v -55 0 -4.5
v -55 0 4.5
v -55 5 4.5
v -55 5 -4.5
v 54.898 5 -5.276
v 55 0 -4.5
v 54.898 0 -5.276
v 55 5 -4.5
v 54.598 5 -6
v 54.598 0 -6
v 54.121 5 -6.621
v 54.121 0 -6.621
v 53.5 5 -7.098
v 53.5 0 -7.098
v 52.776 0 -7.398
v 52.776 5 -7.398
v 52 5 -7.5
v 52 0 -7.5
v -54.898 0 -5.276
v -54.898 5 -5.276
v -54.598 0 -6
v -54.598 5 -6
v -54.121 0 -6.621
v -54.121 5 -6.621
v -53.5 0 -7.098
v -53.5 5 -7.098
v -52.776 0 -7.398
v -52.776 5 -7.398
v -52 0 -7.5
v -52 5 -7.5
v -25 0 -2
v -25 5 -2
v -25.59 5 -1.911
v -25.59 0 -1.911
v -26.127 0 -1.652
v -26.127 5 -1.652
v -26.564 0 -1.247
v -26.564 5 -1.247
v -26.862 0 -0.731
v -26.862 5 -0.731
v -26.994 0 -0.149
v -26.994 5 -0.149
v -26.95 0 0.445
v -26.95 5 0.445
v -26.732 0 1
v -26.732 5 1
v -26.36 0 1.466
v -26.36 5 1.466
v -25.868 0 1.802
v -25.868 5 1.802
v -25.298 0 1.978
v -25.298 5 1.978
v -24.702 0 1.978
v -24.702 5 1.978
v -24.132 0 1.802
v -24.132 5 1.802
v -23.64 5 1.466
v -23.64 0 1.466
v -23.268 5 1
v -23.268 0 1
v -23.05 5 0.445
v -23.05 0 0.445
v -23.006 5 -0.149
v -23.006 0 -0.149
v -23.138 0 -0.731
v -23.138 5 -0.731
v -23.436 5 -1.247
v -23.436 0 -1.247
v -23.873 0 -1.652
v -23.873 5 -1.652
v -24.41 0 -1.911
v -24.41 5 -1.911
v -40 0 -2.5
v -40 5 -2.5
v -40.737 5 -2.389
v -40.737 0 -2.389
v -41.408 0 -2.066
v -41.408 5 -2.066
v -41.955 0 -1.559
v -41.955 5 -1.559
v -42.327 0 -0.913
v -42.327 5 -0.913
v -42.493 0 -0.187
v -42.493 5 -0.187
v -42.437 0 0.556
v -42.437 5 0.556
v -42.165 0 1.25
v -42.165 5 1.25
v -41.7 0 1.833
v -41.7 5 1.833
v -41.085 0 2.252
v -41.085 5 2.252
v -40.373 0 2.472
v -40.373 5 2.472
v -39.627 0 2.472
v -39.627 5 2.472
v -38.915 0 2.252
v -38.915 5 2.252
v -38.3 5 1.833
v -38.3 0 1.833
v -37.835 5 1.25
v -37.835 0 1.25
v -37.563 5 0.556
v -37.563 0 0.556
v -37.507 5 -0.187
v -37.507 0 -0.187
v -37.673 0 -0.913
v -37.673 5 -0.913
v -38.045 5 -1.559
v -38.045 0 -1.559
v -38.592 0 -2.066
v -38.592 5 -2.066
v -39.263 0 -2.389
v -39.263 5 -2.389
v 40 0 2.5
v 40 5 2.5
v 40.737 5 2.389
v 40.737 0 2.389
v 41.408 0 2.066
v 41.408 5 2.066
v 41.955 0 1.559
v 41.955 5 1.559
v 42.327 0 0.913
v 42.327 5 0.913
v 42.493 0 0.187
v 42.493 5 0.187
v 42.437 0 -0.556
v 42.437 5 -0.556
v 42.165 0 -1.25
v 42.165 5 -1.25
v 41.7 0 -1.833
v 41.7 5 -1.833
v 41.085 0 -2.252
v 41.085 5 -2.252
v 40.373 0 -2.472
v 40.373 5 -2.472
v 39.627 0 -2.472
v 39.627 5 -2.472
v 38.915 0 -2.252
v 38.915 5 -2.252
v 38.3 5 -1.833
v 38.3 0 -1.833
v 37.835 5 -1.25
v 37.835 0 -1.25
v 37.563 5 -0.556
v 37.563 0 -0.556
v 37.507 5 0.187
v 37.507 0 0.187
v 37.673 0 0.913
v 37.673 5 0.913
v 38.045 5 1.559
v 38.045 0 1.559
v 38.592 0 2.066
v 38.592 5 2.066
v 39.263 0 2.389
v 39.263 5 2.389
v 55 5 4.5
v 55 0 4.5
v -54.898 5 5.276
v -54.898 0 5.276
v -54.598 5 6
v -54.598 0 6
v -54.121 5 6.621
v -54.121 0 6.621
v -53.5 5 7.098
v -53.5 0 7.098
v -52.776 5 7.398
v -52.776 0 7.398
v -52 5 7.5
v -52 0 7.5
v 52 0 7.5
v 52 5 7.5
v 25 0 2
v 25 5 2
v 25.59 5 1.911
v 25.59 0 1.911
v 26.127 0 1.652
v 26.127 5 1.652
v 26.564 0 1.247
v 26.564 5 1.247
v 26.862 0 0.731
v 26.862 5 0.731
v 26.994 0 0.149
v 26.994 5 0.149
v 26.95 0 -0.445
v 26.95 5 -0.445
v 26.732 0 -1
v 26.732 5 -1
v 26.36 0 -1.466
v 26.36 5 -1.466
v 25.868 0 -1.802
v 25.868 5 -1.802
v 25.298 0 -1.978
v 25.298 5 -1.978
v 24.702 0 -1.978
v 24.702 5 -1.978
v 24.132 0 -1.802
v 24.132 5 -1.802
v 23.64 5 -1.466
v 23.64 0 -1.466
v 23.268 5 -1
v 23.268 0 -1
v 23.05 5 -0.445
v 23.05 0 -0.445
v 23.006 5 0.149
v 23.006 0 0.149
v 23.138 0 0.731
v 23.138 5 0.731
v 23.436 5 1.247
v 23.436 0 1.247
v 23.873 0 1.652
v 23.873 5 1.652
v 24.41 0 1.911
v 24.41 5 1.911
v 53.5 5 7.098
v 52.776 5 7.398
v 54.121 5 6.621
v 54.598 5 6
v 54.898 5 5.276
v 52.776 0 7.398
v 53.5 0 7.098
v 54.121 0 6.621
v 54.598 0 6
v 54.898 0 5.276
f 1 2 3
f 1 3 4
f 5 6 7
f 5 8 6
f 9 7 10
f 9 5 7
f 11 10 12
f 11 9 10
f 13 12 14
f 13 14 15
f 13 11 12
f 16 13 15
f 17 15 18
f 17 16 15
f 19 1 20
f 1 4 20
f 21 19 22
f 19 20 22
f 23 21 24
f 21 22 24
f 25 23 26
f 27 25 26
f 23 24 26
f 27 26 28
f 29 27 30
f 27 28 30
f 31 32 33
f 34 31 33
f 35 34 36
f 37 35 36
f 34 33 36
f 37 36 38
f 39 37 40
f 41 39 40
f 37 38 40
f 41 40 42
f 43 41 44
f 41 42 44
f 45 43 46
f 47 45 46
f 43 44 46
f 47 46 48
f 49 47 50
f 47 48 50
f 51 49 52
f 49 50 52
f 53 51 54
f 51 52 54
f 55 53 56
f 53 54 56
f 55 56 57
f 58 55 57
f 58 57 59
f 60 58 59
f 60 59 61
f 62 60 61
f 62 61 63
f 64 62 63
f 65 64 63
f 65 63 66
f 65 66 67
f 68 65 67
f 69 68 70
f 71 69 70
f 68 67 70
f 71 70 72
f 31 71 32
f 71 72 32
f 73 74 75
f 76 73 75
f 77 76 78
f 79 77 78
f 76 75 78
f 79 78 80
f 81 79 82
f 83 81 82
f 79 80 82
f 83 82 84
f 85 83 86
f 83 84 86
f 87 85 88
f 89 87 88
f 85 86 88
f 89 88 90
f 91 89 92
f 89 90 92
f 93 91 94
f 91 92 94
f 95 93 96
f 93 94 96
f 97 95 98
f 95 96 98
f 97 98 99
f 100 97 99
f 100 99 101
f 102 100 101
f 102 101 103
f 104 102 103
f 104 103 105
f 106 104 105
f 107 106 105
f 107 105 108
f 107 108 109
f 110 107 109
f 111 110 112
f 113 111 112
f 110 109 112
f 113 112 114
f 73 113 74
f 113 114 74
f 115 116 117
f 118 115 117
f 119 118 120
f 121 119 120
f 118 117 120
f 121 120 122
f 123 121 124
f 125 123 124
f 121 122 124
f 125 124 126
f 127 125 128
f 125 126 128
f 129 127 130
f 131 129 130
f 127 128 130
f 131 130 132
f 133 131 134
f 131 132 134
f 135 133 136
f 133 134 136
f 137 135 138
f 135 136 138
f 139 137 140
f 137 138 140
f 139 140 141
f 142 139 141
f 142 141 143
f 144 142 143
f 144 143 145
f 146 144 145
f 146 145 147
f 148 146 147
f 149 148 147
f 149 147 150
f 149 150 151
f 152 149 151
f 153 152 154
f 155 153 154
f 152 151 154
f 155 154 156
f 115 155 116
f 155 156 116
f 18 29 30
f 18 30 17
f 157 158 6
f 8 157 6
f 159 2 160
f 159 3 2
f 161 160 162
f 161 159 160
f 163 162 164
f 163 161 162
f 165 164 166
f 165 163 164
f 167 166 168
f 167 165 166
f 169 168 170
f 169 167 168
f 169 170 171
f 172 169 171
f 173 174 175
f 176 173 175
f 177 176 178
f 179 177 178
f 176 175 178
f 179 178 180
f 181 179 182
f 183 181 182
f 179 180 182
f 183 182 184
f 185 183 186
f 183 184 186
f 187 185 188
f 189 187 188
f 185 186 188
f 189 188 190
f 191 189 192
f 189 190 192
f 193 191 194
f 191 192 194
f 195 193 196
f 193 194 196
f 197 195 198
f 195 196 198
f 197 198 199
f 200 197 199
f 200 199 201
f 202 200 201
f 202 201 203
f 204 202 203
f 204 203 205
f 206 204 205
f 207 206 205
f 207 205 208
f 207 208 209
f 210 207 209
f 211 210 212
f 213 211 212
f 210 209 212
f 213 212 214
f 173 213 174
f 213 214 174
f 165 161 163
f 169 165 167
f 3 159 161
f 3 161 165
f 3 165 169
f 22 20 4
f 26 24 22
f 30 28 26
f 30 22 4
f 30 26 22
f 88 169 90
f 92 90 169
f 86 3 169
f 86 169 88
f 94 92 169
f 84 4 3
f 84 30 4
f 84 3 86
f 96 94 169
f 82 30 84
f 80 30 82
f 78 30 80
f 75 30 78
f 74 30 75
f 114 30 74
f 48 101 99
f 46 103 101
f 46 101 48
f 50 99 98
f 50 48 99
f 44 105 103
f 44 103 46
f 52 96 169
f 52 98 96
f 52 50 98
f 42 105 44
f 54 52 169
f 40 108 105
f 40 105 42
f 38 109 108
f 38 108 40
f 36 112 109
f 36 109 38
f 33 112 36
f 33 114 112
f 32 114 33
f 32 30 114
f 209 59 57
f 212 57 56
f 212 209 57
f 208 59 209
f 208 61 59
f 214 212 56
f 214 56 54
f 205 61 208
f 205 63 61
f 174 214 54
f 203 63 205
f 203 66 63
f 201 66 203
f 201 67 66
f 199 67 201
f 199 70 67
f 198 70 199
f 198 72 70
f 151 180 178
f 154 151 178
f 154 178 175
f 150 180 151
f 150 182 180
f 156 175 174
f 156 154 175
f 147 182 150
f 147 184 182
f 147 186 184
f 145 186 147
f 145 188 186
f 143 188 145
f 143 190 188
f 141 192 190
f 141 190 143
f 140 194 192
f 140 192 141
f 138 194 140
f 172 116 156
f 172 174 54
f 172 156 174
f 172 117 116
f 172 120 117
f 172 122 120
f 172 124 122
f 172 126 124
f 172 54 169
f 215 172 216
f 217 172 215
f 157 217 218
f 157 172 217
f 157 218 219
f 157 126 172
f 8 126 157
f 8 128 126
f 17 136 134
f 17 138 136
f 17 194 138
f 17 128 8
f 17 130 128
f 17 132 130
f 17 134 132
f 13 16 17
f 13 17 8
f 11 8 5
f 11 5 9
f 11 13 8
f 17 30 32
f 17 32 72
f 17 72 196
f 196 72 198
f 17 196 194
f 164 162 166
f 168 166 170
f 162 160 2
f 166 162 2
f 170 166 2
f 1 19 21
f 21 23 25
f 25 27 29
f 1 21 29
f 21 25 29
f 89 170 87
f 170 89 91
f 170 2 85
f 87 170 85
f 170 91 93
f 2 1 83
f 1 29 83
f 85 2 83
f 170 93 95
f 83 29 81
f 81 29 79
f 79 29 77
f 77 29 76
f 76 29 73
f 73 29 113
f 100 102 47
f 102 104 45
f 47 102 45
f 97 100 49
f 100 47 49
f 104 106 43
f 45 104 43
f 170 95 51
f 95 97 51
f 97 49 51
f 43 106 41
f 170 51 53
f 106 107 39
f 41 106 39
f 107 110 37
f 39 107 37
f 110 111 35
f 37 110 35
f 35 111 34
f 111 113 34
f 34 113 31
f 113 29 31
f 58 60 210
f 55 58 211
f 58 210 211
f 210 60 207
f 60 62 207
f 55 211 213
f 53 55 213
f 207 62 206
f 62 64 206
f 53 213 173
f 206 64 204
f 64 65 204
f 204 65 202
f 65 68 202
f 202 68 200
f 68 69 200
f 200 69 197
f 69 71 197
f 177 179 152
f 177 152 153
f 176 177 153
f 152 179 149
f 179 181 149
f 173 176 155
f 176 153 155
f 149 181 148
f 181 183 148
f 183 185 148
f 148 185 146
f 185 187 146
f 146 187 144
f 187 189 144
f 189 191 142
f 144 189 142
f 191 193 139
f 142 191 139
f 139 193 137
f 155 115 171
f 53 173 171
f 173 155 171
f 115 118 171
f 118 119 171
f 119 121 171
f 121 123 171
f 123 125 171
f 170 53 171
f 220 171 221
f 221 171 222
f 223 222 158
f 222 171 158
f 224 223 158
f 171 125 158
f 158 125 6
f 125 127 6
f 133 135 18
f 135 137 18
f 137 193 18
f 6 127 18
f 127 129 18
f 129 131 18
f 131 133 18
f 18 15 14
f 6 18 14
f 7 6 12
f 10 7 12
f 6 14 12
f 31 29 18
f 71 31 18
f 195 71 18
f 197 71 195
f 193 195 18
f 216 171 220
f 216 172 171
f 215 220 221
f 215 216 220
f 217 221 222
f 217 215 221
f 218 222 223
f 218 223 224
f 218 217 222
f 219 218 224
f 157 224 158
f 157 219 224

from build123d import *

# Parameters (mm, degrees)
SKETCH_1_W          = 110
SKETCH_1_H          = 15
EXTRUDE_1_DEPTH     = 5
FILLET_1_R          = 3
SKETCH_2_R          = 2.5
SKETCH_2_R_2        = 2
CUT_EXTRUDE_1_DEPTH = 5


with BuildPart() as part:
    # 草图1 → 凸台-拉伸1 (new body)
    with BuildSketch(Plane(origin=(0, 0, 0), x_dir=(1, 0, 0), z_dir=(0, 1, 0))):
        Rectangle(SKETCH_1_W, SKETCH_1_H)
    extrude(amount=EXTRUDE_1_DEPTH)

    # 圆角1
    fillet_1_edges = [part.edges().sort_by_distance(p)[0] for p in [
        (55, 2.5, 7.5),
        (-55, 2.5, 7.5),
        (-55, 2.5, -7.5),
        (55, 2.5, -7.5),
    ]]
    fillet(fillet_1_edges, radius=FILLET_1_R)

    # 草图2 → 切除-拉伸1 (cut)
    with BuildSketch(Plane(origin=(0, 5, 0), x_dir=(1, 0, 0), z_dir=(0, 1, 0))):
        with Locations(Location((40, 0, 0), (0, 0, 270))):
            Circle(SKETCH_2_R)
        with Locations(Location((25, 0, 0), (0, 0, 270))):
            Circle(SKETCH_2_R_2)
        with Locations(Location((-40, 0, 0), (0, 0, 90))):
            Circle(SKETCH_2_R)
        with Locations(Location((-25, 0, 0), (0, 0, 90))):
            Circle(SKETCH_2_R_2)
    extrude(amount=-CUT_EXTRUDE_1_DEPTH, mode=Mode.SUBTRACT)


solid = part.part
